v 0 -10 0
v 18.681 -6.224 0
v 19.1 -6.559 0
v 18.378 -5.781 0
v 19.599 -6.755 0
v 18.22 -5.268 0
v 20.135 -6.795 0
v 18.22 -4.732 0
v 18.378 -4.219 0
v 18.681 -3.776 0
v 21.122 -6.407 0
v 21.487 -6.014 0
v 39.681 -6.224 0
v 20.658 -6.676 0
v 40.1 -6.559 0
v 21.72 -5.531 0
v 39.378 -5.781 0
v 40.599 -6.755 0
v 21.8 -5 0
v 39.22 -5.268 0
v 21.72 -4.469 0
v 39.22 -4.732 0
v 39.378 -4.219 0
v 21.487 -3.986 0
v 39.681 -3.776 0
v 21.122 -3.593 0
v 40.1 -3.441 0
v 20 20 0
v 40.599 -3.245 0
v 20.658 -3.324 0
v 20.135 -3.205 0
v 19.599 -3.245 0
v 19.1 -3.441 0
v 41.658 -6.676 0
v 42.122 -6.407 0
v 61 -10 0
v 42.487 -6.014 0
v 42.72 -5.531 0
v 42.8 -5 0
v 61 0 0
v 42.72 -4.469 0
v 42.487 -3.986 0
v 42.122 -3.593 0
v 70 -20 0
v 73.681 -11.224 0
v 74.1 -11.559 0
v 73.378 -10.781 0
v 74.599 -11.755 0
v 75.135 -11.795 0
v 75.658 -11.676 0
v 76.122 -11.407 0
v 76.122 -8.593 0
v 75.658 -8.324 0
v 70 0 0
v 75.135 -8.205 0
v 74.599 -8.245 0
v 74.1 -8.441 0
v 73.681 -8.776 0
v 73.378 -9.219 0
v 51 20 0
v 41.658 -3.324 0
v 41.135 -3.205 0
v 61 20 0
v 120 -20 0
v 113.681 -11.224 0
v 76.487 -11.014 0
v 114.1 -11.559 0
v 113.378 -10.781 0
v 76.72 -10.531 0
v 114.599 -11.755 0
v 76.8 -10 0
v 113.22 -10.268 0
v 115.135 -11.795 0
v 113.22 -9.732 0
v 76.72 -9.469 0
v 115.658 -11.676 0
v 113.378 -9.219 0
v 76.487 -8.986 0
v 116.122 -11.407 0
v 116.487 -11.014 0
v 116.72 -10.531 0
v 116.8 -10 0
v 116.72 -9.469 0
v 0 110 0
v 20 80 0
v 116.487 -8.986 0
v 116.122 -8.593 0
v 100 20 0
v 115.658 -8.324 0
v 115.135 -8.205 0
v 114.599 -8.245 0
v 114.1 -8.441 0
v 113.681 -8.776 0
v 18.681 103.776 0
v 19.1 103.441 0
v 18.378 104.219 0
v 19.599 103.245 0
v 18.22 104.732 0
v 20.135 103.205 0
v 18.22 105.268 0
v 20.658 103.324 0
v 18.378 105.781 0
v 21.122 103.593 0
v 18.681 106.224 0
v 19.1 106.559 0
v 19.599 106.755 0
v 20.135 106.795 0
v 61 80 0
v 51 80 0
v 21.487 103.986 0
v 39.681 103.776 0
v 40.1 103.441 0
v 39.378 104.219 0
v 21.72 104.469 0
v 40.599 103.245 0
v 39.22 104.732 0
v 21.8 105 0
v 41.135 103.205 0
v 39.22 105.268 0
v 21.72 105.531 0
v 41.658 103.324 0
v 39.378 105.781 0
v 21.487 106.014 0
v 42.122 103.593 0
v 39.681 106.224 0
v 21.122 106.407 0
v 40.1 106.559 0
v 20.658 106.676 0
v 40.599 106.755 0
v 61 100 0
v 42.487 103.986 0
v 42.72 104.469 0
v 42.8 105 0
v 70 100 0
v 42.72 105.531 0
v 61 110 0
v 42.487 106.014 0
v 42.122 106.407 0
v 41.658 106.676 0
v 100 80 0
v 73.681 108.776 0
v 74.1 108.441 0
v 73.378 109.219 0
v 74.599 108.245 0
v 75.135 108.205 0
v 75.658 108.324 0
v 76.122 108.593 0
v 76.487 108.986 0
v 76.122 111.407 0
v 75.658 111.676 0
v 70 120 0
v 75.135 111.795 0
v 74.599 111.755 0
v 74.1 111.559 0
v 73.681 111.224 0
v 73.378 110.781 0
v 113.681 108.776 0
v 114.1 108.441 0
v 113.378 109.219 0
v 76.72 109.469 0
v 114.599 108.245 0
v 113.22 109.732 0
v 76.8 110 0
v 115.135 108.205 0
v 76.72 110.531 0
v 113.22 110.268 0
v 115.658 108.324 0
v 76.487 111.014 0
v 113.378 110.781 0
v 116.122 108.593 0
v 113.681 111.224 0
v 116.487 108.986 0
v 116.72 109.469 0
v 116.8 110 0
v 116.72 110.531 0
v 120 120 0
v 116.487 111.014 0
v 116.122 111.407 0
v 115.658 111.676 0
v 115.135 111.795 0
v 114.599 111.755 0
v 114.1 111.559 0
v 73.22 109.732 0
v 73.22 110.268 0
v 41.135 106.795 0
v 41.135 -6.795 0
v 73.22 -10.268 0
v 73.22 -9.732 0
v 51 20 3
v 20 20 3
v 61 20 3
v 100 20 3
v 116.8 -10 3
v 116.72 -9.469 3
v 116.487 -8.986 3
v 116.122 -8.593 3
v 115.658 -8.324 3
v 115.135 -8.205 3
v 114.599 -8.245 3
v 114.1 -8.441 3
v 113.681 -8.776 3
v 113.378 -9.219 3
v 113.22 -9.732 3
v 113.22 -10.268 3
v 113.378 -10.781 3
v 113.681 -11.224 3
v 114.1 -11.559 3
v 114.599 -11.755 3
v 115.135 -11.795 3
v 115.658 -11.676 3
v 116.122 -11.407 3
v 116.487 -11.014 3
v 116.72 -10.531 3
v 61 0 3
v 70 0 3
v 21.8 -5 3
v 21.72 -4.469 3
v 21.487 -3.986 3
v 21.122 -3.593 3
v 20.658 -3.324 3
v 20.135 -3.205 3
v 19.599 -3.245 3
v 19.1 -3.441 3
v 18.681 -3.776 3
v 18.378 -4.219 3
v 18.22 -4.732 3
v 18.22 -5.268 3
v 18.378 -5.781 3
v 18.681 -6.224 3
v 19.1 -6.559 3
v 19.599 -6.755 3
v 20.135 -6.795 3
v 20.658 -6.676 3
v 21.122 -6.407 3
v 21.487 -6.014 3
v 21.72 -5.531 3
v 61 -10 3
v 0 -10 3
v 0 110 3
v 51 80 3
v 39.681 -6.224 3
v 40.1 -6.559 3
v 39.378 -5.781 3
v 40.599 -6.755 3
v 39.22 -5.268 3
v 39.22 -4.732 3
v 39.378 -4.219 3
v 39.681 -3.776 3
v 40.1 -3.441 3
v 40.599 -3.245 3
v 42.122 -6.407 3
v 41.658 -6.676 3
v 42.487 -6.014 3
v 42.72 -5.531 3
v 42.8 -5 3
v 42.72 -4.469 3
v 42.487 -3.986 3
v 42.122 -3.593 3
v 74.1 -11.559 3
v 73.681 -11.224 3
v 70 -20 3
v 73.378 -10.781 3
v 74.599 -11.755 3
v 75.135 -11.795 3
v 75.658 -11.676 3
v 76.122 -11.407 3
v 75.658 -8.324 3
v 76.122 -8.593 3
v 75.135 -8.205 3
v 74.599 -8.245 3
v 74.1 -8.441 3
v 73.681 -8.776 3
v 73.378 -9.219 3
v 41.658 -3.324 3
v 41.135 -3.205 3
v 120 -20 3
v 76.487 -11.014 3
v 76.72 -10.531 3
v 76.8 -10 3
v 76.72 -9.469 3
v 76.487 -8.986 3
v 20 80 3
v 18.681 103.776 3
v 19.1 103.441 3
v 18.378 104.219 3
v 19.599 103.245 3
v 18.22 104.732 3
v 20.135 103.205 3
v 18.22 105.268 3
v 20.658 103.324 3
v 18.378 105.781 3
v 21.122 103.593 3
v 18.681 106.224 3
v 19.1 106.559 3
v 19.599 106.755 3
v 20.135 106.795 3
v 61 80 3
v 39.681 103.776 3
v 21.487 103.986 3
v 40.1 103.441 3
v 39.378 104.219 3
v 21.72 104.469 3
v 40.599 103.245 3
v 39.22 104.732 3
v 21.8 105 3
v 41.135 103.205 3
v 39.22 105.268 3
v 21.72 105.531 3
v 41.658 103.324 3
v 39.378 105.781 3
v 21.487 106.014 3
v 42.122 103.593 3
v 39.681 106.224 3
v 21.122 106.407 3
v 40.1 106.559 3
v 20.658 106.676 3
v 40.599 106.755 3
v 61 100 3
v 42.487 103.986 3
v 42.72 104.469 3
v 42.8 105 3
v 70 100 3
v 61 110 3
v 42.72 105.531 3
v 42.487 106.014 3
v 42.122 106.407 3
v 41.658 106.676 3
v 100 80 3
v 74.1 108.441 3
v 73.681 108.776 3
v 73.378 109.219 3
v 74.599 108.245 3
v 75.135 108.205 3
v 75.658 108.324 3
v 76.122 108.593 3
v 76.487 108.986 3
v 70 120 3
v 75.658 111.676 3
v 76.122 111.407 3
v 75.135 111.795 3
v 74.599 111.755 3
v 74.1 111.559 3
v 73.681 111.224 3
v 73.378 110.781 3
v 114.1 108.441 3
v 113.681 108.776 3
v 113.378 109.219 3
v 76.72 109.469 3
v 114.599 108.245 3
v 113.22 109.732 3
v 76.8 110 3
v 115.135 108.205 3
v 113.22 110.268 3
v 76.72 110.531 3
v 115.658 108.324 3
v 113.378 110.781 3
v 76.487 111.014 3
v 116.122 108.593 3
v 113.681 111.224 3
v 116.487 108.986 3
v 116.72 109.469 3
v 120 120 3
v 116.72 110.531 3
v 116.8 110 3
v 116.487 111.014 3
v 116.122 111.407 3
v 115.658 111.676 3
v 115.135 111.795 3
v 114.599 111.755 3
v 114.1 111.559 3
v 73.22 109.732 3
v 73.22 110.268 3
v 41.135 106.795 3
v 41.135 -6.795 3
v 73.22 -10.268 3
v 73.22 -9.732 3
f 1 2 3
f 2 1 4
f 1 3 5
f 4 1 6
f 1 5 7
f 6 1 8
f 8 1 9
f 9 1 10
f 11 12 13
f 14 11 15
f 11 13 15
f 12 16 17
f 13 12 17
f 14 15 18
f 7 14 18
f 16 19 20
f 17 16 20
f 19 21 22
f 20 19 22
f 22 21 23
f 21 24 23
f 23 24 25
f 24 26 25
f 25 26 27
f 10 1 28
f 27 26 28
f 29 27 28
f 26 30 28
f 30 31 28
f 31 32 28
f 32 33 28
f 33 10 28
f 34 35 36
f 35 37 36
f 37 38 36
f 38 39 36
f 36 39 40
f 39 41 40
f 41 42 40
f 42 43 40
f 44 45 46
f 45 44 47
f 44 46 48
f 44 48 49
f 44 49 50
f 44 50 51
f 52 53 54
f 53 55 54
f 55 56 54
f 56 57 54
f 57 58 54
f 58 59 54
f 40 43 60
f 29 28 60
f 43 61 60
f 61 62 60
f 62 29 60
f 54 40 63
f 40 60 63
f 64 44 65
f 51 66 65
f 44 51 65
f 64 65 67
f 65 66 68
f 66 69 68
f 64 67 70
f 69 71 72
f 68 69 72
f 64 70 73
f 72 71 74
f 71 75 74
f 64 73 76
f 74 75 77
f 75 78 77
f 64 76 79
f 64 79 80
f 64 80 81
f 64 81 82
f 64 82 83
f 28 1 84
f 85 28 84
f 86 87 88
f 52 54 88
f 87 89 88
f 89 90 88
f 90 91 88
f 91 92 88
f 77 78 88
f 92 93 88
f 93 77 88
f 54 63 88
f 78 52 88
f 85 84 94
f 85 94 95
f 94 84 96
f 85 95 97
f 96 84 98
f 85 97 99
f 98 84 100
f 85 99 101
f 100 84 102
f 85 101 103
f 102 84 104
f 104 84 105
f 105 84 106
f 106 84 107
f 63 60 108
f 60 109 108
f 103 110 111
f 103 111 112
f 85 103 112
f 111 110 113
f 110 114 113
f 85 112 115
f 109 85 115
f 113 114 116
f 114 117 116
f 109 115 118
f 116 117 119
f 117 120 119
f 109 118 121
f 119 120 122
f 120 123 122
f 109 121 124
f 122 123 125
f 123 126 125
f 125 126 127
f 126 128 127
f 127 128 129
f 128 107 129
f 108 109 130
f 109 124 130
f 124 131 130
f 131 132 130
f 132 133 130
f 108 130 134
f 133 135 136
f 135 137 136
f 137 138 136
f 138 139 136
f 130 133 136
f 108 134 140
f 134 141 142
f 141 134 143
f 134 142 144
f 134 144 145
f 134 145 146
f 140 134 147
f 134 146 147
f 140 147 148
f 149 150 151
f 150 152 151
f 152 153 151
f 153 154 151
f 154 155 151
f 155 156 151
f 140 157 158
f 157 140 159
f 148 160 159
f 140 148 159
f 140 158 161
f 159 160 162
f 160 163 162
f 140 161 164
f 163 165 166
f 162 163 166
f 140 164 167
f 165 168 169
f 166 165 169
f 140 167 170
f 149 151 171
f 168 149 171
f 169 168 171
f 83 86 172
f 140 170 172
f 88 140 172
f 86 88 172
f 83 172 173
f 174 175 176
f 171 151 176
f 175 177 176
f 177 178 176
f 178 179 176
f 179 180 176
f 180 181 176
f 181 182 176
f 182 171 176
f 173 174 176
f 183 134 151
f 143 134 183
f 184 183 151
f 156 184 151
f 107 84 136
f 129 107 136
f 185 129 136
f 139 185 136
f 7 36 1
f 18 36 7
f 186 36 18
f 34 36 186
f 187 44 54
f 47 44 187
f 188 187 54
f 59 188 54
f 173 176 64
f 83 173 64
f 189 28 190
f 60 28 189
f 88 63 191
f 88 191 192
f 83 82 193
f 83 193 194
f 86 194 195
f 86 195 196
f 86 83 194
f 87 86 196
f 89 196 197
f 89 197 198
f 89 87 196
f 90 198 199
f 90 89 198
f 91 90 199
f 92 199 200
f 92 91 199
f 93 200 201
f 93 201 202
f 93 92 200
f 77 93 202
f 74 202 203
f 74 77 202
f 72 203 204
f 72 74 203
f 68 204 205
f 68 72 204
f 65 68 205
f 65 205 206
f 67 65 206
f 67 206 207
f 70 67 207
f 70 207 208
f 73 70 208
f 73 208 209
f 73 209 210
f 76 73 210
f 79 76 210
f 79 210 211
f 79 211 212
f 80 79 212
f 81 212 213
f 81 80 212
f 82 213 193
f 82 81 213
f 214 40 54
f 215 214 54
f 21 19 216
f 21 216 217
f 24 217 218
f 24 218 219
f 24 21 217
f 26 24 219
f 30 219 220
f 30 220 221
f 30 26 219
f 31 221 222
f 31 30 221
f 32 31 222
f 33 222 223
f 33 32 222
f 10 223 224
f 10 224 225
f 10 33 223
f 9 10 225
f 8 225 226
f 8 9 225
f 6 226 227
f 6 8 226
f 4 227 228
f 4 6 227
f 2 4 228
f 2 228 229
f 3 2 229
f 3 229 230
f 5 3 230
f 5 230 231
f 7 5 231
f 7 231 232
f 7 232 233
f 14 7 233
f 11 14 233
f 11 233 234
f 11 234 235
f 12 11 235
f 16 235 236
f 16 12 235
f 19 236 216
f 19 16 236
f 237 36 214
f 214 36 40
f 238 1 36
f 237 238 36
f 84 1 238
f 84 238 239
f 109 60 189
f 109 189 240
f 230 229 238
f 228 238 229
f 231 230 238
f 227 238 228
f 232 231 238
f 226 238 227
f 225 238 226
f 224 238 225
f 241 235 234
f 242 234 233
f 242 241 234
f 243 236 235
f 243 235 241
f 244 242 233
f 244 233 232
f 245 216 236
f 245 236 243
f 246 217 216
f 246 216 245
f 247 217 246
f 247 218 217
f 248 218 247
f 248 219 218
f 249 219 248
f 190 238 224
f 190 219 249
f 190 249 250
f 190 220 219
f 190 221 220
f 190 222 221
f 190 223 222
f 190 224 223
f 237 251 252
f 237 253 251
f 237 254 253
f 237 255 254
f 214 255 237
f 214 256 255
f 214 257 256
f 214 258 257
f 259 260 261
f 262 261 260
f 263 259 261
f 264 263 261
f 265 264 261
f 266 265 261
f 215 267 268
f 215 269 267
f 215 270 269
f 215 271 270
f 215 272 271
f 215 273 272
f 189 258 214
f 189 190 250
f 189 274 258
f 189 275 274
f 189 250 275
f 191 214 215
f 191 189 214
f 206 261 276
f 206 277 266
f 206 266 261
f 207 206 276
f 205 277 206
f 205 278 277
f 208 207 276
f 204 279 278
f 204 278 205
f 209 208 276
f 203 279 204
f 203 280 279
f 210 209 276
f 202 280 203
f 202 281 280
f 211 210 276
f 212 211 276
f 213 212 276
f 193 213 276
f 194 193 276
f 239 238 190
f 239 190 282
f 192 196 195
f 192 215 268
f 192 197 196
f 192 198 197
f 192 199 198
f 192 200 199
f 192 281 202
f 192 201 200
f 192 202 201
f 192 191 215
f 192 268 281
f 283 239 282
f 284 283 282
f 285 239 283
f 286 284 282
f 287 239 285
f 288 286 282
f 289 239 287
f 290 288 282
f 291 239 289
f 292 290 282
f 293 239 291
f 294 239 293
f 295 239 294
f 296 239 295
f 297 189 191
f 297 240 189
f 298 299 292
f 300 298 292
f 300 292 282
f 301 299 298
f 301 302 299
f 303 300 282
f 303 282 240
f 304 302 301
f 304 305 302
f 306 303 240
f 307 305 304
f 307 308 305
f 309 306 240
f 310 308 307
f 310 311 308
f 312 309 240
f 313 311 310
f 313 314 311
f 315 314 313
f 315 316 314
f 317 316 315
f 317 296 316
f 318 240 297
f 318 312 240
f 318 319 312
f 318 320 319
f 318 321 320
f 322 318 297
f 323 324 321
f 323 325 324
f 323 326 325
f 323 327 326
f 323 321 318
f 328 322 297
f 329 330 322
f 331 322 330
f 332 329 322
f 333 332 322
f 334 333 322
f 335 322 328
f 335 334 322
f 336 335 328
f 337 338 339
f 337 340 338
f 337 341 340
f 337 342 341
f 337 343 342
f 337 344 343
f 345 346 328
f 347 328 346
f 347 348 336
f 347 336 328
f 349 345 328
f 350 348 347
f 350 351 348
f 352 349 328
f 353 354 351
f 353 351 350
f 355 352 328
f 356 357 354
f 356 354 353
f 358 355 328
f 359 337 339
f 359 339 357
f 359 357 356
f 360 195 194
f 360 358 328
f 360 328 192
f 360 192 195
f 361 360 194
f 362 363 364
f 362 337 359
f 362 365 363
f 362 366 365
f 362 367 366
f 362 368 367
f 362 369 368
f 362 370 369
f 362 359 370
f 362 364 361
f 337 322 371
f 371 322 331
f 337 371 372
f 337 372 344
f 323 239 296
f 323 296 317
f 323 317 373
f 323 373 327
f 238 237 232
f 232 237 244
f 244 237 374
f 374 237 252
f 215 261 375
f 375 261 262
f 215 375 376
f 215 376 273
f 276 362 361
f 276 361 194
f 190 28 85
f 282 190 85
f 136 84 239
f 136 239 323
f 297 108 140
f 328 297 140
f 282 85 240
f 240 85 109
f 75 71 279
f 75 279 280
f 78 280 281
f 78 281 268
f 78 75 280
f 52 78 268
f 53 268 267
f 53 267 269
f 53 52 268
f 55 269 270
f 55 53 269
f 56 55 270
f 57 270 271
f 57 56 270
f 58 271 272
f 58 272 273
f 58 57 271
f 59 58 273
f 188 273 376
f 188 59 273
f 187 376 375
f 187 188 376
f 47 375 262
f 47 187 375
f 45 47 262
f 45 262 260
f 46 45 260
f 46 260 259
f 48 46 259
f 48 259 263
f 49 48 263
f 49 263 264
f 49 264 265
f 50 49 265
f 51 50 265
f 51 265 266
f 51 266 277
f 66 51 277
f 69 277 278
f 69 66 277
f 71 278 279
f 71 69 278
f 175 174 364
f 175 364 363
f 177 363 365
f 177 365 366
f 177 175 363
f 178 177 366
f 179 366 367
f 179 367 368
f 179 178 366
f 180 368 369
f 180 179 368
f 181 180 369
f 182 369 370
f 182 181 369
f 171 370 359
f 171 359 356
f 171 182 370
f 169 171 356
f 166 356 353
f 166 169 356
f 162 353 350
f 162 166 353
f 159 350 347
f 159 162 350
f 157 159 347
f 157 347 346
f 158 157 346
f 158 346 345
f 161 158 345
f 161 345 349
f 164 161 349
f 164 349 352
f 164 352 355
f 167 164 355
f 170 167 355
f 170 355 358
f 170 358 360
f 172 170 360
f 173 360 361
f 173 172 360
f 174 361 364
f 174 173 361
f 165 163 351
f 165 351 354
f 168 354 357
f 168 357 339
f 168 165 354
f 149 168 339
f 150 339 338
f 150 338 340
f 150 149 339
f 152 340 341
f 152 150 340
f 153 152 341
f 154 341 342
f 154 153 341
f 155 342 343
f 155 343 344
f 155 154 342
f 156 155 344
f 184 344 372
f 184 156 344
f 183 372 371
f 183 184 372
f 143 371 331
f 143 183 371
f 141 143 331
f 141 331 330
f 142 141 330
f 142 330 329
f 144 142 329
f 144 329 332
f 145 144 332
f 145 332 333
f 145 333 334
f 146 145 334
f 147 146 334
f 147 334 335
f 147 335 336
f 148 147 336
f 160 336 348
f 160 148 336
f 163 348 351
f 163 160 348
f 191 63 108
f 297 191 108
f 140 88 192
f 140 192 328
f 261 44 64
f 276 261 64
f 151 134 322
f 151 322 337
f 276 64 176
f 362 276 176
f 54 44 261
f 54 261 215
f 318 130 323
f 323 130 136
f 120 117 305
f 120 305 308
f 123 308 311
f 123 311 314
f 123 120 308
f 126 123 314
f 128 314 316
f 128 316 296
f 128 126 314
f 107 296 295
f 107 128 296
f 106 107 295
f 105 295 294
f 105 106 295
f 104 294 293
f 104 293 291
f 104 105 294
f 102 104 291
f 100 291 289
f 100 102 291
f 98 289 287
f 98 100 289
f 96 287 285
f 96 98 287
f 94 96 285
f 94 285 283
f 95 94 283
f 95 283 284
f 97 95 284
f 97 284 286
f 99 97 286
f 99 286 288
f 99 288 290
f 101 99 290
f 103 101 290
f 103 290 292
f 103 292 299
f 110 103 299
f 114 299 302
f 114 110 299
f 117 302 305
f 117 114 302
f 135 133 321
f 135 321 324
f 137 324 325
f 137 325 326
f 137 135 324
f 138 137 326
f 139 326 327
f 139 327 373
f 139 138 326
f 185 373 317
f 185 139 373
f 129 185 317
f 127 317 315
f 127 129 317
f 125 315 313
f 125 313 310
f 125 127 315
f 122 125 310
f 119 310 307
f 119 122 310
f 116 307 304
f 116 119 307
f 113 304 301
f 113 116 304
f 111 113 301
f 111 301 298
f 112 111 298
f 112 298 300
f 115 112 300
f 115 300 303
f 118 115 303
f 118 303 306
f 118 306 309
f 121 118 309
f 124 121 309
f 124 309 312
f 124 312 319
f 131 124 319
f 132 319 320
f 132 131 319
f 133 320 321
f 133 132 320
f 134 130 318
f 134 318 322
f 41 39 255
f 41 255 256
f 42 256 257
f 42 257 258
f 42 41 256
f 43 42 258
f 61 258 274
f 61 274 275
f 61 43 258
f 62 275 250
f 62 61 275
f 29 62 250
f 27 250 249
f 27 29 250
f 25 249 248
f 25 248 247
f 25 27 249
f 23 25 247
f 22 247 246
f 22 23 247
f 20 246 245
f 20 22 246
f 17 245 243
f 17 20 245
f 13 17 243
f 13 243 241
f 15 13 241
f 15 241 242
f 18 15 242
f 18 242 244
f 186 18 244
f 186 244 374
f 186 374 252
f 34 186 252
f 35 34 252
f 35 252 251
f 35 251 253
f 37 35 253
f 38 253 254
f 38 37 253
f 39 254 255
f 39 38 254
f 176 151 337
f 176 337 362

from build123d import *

# Parameters (mm, degrees)
ESQUISSE1_W        = 120
ESQUISSE1_H        = 100
ESQUISSE1_W_2      = 39
ESQUISSE1_H_2      = 60
ESQUISSE1_W_3      = 31
ESQUISSE1_W_4      = 50
ESQUISSE1_H_3      = 20
ESQUISSE1_R        = 1.8
ESQUISSE1_W_5      = 61
ESQUISSE1_H_4      = 10
BOSS_EXTRU_1_DEPTH = 3


with BuildPart() as part:
    # Esquisse1 → Boss.-Extru.1 (new body)
    # profile 1 of 5: a face of its own
    with BuildSketch(Plane.XY):
        with Locations((60, 50)):
            Rectangle(ESQUISSE1_W, ESQUISSE1_H)
        with Locations((80.5, 50)):
            Rectangle(ESQUISSE1_W_2, ESQUISSE1_H_2, mode=Mode.SUBTRACT)
        with Locations((35.5, 50)):
            Rectangle(ESQUISSE1_W_3, ESQUISSE1_H_2, mode=Mode.SUBTRACT)
    # profile 2 of 5: a face of its own
    with BuildSketch(Plane.XY):
        with Locations((95, -10)):
            Rectangle(ESQUISSE1_W_4, ESQUISSE1_H_3)
        with Locations((75, -10)):
            Circle(ESQUISSE1_R, mode=Mode.SUBTRACT)
        with Locations((115, -10)):
            Circle(ESQUISSE1_R, mode=Mode.SUBTRACT)
    # profile 3 of 5: a face of its own
    with BuildSketch(Plane.XY):
        with Locations((30.5, -5)):
            Rectangle(ESQUISSE1_W_5, ESQUISSE1_H_4)
        with Locations((20, -5)):
            Circle(ESQUISSE1_R, mode=Mode.SUBTRACT)
        with Locations((41, -5)):
            Circle(ESQUISSE1_R, mode=Mode.SUBTRACT)
    # profile 4 of 5: a face of its own
    with BuildSketch(Plane.XY):
        with Locations((30.5, 105)):
            Rectangle(ESQUISSE1_W_5, ESQUISSE1_H_4)
        with Locations((20, 105)):
            Circle(ESQUISSE1_R, mode=Mode.SUBTRACT)
        with Locations((41, 105)):
            Circle(ESQUISSE1_R, mode=Mode.SUBTRACT)
    # profile 5 of 5: a face of its own
    with BuildSketch(Plane.XY):
        with Locations((95, 110)):
            Rectangle(ESQUISSE1_W_4, ESQUISSE1_H_3)
        with Locations((75, 110)):
            Circle(ESQUISSE1_R, mode=Mode.SUBTRACT)
        with Locations((115, 110)):
            Circle(ESQUISSE1_R, mode=Mode.SUBTRACT)
    extrude(amount=BOSS_EXTRU_1_DEPTH)


solid = part.part
